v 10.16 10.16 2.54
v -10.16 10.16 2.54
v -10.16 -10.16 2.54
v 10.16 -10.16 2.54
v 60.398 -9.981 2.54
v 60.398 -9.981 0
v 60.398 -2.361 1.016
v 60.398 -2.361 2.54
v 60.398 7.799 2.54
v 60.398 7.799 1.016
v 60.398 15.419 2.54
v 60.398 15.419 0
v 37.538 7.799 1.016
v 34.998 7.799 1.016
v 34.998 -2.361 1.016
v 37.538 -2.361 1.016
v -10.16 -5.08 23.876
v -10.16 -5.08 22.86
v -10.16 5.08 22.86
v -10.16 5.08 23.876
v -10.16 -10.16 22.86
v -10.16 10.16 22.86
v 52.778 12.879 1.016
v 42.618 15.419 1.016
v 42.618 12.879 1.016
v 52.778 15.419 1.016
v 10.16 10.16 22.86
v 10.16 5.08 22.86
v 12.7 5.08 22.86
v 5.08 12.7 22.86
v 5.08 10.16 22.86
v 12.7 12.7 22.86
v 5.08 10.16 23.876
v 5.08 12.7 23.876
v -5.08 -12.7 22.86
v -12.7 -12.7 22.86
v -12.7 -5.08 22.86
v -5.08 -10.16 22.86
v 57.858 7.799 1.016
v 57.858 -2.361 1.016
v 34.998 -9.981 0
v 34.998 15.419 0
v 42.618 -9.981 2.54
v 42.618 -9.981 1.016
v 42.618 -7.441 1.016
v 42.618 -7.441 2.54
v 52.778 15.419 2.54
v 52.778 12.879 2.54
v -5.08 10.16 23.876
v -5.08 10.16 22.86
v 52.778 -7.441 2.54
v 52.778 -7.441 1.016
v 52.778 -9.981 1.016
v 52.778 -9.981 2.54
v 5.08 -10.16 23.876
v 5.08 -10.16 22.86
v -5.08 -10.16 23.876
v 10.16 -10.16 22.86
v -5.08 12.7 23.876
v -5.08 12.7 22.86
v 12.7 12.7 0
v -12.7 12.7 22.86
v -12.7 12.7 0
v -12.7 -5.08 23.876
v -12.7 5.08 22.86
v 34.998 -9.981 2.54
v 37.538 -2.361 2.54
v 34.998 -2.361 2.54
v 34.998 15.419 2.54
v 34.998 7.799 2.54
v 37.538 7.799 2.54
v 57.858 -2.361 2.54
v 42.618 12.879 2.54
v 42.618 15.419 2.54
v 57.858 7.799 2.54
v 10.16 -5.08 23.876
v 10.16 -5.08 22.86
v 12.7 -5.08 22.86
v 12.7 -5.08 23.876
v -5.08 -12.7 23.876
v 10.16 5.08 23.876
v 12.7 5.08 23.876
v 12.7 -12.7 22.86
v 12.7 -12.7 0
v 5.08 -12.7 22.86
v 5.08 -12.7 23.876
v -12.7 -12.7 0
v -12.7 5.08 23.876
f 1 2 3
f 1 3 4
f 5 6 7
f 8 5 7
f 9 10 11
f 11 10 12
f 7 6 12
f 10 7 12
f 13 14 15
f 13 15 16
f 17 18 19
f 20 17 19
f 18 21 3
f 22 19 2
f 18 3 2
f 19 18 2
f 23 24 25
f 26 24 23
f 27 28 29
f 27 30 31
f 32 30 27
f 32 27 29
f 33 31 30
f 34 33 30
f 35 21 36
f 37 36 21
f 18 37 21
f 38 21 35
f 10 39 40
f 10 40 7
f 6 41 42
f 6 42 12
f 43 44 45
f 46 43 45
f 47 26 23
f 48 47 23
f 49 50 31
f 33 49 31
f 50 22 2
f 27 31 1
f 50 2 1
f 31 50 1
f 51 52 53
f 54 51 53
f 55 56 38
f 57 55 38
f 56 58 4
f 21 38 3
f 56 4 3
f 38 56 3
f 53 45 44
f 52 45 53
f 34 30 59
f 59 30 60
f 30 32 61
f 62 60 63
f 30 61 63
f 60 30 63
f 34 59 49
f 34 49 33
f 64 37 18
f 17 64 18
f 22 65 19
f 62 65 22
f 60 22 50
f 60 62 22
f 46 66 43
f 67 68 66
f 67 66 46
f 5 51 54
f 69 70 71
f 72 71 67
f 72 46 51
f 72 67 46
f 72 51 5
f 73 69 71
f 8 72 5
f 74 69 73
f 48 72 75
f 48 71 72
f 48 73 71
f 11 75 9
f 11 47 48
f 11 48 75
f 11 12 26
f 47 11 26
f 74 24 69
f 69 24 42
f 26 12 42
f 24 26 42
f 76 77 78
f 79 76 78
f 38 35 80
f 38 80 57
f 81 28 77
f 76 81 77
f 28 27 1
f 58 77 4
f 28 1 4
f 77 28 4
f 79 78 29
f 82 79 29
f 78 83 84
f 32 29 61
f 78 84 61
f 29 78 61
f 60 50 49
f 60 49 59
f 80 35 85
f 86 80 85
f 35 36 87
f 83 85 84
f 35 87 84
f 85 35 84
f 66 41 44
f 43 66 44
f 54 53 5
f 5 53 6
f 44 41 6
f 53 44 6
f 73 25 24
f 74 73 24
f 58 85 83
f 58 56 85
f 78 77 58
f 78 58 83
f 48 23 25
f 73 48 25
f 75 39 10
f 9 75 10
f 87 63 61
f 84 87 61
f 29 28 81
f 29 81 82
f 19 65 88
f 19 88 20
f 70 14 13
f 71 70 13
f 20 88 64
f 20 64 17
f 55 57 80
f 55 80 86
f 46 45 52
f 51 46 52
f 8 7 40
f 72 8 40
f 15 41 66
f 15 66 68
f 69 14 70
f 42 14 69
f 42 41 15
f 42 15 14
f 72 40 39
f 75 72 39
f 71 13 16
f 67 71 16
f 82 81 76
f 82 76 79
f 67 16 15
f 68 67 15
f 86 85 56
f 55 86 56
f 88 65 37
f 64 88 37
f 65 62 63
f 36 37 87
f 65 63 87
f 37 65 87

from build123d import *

# Parameters (mm, degrees)
F1_DEPTH = 2.54
F0_W     = 10.16
F0_H     = 2.54
F0_W_2   = 2.54
F0_H_2   = 10.16
F2_DEPTH = 23.876
F3_DEPTH = 22.86
F4_DEPTH = 1.016


with BuildPart() as f1:
    # F0 (on Top) → F1 (new body)
    with BuildSketch(Plane.XY):
        Polygon((-5.08, -10.16), (5.08, -10.16), (10.16, -10.16), (10.16, -5.08), (10.16, 5.08), (10.16, 10.16), (5.08, 10.16), (-5.08, 10.16), (-10.16, 10.16), (-10.16, 5.08), (-10.16, -5.08), (-10.16, -10.16), align=None)
    extrude(amount=F1_DEPTH)

    # F0 (on Top) → F2 (join)
    with BuildSketch(Plane.XY):
        with Locations((0, 11.43)):
            Rectangle(F0_W, F0_H)
        with Locations((11.43, 0)):
            Rectangle(F0_W_2, F0_H_2)
        with Locations((0, -11.43)):
            Rectangle(F0_W, F0_H)
        with Locations((-11.43, 0)):
            Rectangle(F0_W_2, F0_H_2)
    extrude(amount=F2_DEPTH)

    # F0 (on Top) → F3 (join)
    with BuildSketch(Plane.XY):
        Polygon((-12.7, 12.7), (-12.7, 5.08), (-10.16, 5.08), (-10.16, 10.16), (-5.08, 10.16), (-5.08, 12.7), align=None)
        Polygon((10.16, 5.08), (12.7, 5.08), (12.7, 12.7), (5.08, 12.7), (5.08, 10.16), (10.16, 10.16), align=None)
        Polygon((-12.7, -12.7), (-5.08, -12.7), (-5.08, -10.16), (-10.16, -10.16), (-10.16, -5.08), (-12.7, -5.08), align=None)
        Polygon((5.08, -12.7), (12.7, -12.7), (12.7, -5.08), (10.16, -5.08), (10.16, -10.16), (5.08, -10.16), align=None)
    extrude(amount=F3_DEPTH)


with BuildPart() as f1b:
    # F0 (on Top) → F1, piece 2 (new body)
    with BuildSketch(Plane.XY):
        Polygon((42.6179911327, -7.4406659061), (52.7779911327, -7.4406659061), (57.8579911327, -7.4406659061), (57.8579911327, -2.3606659061), (57.8579911327, 7.7993340939), (57.8579911327, 12.8793340939), (52.7779911327, 12.8793340939), (42.6179911327, 12.8793340939), (37.5379911327, 12.8793340939), (37.5379911327, 7.7993340939), (37.5379911327, -2.3606659061), (37.5379911327, -7.4406659061), align=None)
        Polygon((34.9979911327, 15.4193340939), (34.9979911327, 7.7993340939), (37.5379911327, 7.7993340939), (37.5379911327, 12.8793340939), (42.6179911327, 12.8793340939), (42.6179911327, 15.4193340939), align=None)
        Polygon((57.8579911327, 7.7993340939), (60.3979911327, 7.7993340939), (60.3979911327, 15.4193340939), (52.7779911327, 15.4193340939), (52.7779911327, 12.8793340939), (57.8579911327, 12.8793340939), align=None)
        Polygon((52.7779911327, -9.9806659061), (60.3979911327, -9.9806659061), (60.3979911327, -2.3606659061), (57.8579911327, -2.3606659061), (57.8579911327, -7.4406659061), (52.7779911327, -7.4406659061), align=None)
        Polygon((34.9979911327, -9.9806659061), (42.6179911327, -9.9806659061), (42.6179911327, -7.4406659061), (37.5379911327, -7.4406659061), (37.5379911327, -2.3606659061), (34.9979911327, -2.3606659061), align=None)
    extrude(amount=F1_DEPTH)

    # F0 (on Top) → F4 (join)
    with BuildSketch(Plane.XY):
        with Locations((36.2679911327, 2.7193340939)):
            Rectangle(F0_W_2, F0_H_2)
        with Locations((47.6979911327, 14.1493340939)):
            Rectangle(F0_W, F0_H)
        with Locations((59.1279911327, 2.7193340939)):
            Rectangle(F0_W_2, F0_H_2)
        with Locations((47.6979911327, -8.7106659061)):
            Rectangle(F0_W, F0_H)
    extrude(amount=F4_DEPTH)


solid = Compound([f1.part, f1b.part])
